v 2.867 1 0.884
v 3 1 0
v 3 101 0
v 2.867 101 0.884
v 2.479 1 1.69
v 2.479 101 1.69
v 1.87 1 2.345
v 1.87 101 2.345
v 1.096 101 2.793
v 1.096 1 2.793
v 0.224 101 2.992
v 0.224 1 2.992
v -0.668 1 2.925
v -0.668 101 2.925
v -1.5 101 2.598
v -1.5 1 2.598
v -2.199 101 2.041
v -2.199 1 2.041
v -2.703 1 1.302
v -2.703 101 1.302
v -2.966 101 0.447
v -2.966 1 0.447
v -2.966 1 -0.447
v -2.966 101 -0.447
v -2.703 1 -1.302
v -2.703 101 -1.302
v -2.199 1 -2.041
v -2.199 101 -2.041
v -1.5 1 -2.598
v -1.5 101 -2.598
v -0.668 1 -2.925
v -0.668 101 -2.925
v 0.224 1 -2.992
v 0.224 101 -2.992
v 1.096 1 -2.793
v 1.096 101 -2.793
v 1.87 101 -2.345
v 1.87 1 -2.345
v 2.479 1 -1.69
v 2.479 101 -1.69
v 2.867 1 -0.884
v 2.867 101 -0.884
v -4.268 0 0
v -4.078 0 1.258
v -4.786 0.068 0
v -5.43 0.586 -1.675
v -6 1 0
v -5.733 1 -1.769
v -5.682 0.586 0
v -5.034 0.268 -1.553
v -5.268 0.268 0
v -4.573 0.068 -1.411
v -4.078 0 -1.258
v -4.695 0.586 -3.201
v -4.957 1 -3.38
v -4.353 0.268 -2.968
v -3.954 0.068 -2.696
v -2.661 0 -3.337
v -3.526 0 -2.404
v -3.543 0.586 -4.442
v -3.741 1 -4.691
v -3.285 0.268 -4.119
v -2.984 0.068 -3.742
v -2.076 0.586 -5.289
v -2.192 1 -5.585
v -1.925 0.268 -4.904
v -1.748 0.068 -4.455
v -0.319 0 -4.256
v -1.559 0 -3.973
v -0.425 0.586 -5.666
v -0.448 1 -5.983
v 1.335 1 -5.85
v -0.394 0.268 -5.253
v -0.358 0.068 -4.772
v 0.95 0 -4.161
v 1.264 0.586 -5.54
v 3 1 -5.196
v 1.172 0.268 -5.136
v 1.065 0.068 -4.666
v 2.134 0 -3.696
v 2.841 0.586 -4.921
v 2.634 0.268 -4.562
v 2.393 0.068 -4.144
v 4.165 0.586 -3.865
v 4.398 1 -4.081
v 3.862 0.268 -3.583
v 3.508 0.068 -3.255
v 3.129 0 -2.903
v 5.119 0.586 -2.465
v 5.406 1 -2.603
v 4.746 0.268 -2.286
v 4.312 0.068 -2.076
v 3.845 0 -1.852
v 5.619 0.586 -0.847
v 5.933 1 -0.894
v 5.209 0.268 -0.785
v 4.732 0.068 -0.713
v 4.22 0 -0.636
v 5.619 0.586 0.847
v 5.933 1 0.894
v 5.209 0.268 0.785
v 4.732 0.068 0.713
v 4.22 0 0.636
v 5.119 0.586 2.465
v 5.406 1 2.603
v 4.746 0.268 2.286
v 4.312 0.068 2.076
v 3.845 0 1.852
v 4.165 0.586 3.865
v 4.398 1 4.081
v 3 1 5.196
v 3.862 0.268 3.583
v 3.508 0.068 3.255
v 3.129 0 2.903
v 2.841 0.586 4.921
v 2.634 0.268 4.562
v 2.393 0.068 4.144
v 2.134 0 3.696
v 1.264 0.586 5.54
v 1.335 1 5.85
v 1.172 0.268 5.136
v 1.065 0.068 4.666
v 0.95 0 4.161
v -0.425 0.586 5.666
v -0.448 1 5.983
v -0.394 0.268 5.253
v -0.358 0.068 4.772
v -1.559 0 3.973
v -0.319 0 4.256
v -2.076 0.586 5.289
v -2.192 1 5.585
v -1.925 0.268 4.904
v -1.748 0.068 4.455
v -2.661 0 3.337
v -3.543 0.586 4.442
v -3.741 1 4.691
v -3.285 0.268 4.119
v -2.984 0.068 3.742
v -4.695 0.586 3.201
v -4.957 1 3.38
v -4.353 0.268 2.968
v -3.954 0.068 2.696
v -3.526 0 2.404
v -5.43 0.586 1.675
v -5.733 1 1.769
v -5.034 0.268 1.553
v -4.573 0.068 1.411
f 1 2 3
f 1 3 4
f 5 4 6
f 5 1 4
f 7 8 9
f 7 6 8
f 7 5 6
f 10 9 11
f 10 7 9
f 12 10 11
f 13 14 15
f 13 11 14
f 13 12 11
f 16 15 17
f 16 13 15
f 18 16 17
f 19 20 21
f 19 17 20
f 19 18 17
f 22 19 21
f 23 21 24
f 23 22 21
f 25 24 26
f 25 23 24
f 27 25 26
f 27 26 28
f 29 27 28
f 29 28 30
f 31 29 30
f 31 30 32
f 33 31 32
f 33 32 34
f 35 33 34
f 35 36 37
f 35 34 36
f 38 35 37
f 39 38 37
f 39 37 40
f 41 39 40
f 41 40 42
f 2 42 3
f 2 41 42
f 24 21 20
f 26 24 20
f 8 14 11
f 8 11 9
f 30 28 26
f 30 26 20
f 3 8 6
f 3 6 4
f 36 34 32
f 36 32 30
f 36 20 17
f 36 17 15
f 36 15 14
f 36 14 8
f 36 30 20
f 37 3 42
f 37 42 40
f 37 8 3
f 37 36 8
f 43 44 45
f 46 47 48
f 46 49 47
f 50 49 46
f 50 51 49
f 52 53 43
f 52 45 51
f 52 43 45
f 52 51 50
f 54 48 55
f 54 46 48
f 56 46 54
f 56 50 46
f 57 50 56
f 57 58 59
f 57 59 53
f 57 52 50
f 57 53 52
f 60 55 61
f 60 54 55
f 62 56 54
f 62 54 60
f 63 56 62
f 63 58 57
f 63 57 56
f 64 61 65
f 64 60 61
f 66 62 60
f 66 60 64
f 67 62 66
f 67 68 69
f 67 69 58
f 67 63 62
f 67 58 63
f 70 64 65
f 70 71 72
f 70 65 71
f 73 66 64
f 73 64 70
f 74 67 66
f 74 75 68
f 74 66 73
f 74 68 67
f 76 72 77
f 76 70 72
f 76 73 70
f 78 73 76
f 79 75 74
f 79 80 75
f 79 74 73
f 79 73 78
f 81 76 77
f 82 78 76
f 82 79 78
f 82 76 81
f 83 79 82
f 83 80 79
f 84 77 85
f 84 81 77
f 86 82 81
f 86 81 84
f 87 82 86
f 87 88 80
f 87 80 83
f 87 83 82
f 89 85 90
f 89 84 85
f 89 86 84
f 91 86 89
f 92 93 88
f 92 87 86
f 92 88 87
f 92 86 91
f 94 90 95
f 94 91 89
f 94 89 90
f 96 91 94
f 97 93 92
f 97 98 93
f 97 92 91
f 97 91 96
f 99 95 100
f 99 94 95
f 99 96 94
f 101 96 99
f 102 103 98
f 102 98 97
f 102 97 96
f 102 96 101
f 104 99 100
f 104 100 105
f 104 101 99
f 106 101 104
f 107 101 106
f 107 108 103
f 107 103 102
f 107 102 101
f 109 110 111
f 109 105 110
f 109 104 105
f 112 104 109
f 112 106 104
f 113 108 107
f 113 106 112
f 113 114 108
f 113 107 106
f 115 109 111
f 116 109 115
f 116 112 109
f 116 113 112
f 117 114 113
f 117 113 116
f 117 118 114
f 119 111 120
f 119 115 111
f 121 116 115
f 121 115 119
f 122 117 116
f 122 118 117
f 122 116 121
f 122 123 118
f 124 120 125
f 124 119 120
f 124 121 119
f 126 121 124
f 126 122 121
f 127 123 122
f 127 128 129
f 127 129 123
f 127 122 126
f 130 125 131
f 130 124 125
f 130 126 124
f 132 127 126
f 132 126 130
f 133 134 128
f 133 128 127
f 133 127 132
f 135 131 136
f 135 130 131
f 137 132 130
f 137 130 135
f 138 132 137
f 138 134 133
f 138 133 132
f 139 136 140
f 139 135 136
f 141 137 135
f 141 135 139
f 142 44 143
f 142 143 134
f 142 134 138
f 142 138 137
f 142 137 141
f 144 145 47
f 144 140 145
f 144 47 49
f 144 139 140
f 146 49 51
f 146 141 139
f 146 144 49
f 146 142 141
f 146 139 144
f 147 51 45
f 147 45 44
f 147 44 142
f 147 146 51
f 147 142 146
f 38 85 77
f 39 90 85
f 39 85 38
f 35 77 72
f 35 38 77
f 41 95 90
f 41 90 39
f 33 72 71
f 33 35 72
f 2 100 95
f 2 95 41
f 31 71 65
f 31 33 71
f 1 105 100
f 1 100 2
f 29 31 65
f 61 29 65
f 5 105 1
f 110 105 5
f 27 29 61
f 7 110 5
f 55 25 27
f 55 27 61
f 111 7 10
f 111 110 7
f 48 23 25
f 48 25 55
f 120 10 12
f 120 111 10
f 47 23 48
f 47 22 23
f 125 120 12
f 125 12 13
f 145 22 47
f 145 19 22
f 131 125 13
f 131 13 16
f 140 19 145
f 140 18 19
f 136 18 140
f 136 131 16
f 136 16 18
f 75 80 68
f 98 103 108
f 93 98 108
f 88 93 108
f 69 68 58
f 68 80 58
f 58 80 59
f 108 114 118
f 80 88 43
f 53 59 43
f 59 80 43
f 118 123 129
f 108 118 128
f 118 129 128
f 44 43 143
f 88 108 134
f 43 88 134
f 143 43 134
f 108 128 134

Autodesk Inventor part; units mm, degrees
ref_plane "YZ Plane" through (0, 0, 0) normal (1, 0, 0) x (0, 1, 0)
ref_plane "XZ Plane" through (0, 0, 0) normal (0, 1, 0) x (-1, 0, 0)
ref_plane "XY Plane" through (0, 0, 0) normal (0, 0, 1) x (1, 0, 0)
sketch "Esquisse1" plane through (0, 0, 0) normal (0, 1, 0) x (-1, 0, 0)
  circle A0 centre (0, 0) radius 6
  dimension "d0" = 12
extrude "Extrusion1" add sketch "Esquisse1" along normal blind 1
sketch "Esquisse2" plane through (0, 1, 0) normal (0, 1, 0) x (1, 0, 0)
  circle A0 centre (0, 0) radius 6 projected
  circle A1 centre (0, 0) radius 3
  dimension "d3" = 6
extrude "Extrusion2" add sketch "Esquisse2" along normal blind 100 contours A1
fillet "Congé1" radius 2 1 edges at (6, 0, 0)
properties part number "mat"
